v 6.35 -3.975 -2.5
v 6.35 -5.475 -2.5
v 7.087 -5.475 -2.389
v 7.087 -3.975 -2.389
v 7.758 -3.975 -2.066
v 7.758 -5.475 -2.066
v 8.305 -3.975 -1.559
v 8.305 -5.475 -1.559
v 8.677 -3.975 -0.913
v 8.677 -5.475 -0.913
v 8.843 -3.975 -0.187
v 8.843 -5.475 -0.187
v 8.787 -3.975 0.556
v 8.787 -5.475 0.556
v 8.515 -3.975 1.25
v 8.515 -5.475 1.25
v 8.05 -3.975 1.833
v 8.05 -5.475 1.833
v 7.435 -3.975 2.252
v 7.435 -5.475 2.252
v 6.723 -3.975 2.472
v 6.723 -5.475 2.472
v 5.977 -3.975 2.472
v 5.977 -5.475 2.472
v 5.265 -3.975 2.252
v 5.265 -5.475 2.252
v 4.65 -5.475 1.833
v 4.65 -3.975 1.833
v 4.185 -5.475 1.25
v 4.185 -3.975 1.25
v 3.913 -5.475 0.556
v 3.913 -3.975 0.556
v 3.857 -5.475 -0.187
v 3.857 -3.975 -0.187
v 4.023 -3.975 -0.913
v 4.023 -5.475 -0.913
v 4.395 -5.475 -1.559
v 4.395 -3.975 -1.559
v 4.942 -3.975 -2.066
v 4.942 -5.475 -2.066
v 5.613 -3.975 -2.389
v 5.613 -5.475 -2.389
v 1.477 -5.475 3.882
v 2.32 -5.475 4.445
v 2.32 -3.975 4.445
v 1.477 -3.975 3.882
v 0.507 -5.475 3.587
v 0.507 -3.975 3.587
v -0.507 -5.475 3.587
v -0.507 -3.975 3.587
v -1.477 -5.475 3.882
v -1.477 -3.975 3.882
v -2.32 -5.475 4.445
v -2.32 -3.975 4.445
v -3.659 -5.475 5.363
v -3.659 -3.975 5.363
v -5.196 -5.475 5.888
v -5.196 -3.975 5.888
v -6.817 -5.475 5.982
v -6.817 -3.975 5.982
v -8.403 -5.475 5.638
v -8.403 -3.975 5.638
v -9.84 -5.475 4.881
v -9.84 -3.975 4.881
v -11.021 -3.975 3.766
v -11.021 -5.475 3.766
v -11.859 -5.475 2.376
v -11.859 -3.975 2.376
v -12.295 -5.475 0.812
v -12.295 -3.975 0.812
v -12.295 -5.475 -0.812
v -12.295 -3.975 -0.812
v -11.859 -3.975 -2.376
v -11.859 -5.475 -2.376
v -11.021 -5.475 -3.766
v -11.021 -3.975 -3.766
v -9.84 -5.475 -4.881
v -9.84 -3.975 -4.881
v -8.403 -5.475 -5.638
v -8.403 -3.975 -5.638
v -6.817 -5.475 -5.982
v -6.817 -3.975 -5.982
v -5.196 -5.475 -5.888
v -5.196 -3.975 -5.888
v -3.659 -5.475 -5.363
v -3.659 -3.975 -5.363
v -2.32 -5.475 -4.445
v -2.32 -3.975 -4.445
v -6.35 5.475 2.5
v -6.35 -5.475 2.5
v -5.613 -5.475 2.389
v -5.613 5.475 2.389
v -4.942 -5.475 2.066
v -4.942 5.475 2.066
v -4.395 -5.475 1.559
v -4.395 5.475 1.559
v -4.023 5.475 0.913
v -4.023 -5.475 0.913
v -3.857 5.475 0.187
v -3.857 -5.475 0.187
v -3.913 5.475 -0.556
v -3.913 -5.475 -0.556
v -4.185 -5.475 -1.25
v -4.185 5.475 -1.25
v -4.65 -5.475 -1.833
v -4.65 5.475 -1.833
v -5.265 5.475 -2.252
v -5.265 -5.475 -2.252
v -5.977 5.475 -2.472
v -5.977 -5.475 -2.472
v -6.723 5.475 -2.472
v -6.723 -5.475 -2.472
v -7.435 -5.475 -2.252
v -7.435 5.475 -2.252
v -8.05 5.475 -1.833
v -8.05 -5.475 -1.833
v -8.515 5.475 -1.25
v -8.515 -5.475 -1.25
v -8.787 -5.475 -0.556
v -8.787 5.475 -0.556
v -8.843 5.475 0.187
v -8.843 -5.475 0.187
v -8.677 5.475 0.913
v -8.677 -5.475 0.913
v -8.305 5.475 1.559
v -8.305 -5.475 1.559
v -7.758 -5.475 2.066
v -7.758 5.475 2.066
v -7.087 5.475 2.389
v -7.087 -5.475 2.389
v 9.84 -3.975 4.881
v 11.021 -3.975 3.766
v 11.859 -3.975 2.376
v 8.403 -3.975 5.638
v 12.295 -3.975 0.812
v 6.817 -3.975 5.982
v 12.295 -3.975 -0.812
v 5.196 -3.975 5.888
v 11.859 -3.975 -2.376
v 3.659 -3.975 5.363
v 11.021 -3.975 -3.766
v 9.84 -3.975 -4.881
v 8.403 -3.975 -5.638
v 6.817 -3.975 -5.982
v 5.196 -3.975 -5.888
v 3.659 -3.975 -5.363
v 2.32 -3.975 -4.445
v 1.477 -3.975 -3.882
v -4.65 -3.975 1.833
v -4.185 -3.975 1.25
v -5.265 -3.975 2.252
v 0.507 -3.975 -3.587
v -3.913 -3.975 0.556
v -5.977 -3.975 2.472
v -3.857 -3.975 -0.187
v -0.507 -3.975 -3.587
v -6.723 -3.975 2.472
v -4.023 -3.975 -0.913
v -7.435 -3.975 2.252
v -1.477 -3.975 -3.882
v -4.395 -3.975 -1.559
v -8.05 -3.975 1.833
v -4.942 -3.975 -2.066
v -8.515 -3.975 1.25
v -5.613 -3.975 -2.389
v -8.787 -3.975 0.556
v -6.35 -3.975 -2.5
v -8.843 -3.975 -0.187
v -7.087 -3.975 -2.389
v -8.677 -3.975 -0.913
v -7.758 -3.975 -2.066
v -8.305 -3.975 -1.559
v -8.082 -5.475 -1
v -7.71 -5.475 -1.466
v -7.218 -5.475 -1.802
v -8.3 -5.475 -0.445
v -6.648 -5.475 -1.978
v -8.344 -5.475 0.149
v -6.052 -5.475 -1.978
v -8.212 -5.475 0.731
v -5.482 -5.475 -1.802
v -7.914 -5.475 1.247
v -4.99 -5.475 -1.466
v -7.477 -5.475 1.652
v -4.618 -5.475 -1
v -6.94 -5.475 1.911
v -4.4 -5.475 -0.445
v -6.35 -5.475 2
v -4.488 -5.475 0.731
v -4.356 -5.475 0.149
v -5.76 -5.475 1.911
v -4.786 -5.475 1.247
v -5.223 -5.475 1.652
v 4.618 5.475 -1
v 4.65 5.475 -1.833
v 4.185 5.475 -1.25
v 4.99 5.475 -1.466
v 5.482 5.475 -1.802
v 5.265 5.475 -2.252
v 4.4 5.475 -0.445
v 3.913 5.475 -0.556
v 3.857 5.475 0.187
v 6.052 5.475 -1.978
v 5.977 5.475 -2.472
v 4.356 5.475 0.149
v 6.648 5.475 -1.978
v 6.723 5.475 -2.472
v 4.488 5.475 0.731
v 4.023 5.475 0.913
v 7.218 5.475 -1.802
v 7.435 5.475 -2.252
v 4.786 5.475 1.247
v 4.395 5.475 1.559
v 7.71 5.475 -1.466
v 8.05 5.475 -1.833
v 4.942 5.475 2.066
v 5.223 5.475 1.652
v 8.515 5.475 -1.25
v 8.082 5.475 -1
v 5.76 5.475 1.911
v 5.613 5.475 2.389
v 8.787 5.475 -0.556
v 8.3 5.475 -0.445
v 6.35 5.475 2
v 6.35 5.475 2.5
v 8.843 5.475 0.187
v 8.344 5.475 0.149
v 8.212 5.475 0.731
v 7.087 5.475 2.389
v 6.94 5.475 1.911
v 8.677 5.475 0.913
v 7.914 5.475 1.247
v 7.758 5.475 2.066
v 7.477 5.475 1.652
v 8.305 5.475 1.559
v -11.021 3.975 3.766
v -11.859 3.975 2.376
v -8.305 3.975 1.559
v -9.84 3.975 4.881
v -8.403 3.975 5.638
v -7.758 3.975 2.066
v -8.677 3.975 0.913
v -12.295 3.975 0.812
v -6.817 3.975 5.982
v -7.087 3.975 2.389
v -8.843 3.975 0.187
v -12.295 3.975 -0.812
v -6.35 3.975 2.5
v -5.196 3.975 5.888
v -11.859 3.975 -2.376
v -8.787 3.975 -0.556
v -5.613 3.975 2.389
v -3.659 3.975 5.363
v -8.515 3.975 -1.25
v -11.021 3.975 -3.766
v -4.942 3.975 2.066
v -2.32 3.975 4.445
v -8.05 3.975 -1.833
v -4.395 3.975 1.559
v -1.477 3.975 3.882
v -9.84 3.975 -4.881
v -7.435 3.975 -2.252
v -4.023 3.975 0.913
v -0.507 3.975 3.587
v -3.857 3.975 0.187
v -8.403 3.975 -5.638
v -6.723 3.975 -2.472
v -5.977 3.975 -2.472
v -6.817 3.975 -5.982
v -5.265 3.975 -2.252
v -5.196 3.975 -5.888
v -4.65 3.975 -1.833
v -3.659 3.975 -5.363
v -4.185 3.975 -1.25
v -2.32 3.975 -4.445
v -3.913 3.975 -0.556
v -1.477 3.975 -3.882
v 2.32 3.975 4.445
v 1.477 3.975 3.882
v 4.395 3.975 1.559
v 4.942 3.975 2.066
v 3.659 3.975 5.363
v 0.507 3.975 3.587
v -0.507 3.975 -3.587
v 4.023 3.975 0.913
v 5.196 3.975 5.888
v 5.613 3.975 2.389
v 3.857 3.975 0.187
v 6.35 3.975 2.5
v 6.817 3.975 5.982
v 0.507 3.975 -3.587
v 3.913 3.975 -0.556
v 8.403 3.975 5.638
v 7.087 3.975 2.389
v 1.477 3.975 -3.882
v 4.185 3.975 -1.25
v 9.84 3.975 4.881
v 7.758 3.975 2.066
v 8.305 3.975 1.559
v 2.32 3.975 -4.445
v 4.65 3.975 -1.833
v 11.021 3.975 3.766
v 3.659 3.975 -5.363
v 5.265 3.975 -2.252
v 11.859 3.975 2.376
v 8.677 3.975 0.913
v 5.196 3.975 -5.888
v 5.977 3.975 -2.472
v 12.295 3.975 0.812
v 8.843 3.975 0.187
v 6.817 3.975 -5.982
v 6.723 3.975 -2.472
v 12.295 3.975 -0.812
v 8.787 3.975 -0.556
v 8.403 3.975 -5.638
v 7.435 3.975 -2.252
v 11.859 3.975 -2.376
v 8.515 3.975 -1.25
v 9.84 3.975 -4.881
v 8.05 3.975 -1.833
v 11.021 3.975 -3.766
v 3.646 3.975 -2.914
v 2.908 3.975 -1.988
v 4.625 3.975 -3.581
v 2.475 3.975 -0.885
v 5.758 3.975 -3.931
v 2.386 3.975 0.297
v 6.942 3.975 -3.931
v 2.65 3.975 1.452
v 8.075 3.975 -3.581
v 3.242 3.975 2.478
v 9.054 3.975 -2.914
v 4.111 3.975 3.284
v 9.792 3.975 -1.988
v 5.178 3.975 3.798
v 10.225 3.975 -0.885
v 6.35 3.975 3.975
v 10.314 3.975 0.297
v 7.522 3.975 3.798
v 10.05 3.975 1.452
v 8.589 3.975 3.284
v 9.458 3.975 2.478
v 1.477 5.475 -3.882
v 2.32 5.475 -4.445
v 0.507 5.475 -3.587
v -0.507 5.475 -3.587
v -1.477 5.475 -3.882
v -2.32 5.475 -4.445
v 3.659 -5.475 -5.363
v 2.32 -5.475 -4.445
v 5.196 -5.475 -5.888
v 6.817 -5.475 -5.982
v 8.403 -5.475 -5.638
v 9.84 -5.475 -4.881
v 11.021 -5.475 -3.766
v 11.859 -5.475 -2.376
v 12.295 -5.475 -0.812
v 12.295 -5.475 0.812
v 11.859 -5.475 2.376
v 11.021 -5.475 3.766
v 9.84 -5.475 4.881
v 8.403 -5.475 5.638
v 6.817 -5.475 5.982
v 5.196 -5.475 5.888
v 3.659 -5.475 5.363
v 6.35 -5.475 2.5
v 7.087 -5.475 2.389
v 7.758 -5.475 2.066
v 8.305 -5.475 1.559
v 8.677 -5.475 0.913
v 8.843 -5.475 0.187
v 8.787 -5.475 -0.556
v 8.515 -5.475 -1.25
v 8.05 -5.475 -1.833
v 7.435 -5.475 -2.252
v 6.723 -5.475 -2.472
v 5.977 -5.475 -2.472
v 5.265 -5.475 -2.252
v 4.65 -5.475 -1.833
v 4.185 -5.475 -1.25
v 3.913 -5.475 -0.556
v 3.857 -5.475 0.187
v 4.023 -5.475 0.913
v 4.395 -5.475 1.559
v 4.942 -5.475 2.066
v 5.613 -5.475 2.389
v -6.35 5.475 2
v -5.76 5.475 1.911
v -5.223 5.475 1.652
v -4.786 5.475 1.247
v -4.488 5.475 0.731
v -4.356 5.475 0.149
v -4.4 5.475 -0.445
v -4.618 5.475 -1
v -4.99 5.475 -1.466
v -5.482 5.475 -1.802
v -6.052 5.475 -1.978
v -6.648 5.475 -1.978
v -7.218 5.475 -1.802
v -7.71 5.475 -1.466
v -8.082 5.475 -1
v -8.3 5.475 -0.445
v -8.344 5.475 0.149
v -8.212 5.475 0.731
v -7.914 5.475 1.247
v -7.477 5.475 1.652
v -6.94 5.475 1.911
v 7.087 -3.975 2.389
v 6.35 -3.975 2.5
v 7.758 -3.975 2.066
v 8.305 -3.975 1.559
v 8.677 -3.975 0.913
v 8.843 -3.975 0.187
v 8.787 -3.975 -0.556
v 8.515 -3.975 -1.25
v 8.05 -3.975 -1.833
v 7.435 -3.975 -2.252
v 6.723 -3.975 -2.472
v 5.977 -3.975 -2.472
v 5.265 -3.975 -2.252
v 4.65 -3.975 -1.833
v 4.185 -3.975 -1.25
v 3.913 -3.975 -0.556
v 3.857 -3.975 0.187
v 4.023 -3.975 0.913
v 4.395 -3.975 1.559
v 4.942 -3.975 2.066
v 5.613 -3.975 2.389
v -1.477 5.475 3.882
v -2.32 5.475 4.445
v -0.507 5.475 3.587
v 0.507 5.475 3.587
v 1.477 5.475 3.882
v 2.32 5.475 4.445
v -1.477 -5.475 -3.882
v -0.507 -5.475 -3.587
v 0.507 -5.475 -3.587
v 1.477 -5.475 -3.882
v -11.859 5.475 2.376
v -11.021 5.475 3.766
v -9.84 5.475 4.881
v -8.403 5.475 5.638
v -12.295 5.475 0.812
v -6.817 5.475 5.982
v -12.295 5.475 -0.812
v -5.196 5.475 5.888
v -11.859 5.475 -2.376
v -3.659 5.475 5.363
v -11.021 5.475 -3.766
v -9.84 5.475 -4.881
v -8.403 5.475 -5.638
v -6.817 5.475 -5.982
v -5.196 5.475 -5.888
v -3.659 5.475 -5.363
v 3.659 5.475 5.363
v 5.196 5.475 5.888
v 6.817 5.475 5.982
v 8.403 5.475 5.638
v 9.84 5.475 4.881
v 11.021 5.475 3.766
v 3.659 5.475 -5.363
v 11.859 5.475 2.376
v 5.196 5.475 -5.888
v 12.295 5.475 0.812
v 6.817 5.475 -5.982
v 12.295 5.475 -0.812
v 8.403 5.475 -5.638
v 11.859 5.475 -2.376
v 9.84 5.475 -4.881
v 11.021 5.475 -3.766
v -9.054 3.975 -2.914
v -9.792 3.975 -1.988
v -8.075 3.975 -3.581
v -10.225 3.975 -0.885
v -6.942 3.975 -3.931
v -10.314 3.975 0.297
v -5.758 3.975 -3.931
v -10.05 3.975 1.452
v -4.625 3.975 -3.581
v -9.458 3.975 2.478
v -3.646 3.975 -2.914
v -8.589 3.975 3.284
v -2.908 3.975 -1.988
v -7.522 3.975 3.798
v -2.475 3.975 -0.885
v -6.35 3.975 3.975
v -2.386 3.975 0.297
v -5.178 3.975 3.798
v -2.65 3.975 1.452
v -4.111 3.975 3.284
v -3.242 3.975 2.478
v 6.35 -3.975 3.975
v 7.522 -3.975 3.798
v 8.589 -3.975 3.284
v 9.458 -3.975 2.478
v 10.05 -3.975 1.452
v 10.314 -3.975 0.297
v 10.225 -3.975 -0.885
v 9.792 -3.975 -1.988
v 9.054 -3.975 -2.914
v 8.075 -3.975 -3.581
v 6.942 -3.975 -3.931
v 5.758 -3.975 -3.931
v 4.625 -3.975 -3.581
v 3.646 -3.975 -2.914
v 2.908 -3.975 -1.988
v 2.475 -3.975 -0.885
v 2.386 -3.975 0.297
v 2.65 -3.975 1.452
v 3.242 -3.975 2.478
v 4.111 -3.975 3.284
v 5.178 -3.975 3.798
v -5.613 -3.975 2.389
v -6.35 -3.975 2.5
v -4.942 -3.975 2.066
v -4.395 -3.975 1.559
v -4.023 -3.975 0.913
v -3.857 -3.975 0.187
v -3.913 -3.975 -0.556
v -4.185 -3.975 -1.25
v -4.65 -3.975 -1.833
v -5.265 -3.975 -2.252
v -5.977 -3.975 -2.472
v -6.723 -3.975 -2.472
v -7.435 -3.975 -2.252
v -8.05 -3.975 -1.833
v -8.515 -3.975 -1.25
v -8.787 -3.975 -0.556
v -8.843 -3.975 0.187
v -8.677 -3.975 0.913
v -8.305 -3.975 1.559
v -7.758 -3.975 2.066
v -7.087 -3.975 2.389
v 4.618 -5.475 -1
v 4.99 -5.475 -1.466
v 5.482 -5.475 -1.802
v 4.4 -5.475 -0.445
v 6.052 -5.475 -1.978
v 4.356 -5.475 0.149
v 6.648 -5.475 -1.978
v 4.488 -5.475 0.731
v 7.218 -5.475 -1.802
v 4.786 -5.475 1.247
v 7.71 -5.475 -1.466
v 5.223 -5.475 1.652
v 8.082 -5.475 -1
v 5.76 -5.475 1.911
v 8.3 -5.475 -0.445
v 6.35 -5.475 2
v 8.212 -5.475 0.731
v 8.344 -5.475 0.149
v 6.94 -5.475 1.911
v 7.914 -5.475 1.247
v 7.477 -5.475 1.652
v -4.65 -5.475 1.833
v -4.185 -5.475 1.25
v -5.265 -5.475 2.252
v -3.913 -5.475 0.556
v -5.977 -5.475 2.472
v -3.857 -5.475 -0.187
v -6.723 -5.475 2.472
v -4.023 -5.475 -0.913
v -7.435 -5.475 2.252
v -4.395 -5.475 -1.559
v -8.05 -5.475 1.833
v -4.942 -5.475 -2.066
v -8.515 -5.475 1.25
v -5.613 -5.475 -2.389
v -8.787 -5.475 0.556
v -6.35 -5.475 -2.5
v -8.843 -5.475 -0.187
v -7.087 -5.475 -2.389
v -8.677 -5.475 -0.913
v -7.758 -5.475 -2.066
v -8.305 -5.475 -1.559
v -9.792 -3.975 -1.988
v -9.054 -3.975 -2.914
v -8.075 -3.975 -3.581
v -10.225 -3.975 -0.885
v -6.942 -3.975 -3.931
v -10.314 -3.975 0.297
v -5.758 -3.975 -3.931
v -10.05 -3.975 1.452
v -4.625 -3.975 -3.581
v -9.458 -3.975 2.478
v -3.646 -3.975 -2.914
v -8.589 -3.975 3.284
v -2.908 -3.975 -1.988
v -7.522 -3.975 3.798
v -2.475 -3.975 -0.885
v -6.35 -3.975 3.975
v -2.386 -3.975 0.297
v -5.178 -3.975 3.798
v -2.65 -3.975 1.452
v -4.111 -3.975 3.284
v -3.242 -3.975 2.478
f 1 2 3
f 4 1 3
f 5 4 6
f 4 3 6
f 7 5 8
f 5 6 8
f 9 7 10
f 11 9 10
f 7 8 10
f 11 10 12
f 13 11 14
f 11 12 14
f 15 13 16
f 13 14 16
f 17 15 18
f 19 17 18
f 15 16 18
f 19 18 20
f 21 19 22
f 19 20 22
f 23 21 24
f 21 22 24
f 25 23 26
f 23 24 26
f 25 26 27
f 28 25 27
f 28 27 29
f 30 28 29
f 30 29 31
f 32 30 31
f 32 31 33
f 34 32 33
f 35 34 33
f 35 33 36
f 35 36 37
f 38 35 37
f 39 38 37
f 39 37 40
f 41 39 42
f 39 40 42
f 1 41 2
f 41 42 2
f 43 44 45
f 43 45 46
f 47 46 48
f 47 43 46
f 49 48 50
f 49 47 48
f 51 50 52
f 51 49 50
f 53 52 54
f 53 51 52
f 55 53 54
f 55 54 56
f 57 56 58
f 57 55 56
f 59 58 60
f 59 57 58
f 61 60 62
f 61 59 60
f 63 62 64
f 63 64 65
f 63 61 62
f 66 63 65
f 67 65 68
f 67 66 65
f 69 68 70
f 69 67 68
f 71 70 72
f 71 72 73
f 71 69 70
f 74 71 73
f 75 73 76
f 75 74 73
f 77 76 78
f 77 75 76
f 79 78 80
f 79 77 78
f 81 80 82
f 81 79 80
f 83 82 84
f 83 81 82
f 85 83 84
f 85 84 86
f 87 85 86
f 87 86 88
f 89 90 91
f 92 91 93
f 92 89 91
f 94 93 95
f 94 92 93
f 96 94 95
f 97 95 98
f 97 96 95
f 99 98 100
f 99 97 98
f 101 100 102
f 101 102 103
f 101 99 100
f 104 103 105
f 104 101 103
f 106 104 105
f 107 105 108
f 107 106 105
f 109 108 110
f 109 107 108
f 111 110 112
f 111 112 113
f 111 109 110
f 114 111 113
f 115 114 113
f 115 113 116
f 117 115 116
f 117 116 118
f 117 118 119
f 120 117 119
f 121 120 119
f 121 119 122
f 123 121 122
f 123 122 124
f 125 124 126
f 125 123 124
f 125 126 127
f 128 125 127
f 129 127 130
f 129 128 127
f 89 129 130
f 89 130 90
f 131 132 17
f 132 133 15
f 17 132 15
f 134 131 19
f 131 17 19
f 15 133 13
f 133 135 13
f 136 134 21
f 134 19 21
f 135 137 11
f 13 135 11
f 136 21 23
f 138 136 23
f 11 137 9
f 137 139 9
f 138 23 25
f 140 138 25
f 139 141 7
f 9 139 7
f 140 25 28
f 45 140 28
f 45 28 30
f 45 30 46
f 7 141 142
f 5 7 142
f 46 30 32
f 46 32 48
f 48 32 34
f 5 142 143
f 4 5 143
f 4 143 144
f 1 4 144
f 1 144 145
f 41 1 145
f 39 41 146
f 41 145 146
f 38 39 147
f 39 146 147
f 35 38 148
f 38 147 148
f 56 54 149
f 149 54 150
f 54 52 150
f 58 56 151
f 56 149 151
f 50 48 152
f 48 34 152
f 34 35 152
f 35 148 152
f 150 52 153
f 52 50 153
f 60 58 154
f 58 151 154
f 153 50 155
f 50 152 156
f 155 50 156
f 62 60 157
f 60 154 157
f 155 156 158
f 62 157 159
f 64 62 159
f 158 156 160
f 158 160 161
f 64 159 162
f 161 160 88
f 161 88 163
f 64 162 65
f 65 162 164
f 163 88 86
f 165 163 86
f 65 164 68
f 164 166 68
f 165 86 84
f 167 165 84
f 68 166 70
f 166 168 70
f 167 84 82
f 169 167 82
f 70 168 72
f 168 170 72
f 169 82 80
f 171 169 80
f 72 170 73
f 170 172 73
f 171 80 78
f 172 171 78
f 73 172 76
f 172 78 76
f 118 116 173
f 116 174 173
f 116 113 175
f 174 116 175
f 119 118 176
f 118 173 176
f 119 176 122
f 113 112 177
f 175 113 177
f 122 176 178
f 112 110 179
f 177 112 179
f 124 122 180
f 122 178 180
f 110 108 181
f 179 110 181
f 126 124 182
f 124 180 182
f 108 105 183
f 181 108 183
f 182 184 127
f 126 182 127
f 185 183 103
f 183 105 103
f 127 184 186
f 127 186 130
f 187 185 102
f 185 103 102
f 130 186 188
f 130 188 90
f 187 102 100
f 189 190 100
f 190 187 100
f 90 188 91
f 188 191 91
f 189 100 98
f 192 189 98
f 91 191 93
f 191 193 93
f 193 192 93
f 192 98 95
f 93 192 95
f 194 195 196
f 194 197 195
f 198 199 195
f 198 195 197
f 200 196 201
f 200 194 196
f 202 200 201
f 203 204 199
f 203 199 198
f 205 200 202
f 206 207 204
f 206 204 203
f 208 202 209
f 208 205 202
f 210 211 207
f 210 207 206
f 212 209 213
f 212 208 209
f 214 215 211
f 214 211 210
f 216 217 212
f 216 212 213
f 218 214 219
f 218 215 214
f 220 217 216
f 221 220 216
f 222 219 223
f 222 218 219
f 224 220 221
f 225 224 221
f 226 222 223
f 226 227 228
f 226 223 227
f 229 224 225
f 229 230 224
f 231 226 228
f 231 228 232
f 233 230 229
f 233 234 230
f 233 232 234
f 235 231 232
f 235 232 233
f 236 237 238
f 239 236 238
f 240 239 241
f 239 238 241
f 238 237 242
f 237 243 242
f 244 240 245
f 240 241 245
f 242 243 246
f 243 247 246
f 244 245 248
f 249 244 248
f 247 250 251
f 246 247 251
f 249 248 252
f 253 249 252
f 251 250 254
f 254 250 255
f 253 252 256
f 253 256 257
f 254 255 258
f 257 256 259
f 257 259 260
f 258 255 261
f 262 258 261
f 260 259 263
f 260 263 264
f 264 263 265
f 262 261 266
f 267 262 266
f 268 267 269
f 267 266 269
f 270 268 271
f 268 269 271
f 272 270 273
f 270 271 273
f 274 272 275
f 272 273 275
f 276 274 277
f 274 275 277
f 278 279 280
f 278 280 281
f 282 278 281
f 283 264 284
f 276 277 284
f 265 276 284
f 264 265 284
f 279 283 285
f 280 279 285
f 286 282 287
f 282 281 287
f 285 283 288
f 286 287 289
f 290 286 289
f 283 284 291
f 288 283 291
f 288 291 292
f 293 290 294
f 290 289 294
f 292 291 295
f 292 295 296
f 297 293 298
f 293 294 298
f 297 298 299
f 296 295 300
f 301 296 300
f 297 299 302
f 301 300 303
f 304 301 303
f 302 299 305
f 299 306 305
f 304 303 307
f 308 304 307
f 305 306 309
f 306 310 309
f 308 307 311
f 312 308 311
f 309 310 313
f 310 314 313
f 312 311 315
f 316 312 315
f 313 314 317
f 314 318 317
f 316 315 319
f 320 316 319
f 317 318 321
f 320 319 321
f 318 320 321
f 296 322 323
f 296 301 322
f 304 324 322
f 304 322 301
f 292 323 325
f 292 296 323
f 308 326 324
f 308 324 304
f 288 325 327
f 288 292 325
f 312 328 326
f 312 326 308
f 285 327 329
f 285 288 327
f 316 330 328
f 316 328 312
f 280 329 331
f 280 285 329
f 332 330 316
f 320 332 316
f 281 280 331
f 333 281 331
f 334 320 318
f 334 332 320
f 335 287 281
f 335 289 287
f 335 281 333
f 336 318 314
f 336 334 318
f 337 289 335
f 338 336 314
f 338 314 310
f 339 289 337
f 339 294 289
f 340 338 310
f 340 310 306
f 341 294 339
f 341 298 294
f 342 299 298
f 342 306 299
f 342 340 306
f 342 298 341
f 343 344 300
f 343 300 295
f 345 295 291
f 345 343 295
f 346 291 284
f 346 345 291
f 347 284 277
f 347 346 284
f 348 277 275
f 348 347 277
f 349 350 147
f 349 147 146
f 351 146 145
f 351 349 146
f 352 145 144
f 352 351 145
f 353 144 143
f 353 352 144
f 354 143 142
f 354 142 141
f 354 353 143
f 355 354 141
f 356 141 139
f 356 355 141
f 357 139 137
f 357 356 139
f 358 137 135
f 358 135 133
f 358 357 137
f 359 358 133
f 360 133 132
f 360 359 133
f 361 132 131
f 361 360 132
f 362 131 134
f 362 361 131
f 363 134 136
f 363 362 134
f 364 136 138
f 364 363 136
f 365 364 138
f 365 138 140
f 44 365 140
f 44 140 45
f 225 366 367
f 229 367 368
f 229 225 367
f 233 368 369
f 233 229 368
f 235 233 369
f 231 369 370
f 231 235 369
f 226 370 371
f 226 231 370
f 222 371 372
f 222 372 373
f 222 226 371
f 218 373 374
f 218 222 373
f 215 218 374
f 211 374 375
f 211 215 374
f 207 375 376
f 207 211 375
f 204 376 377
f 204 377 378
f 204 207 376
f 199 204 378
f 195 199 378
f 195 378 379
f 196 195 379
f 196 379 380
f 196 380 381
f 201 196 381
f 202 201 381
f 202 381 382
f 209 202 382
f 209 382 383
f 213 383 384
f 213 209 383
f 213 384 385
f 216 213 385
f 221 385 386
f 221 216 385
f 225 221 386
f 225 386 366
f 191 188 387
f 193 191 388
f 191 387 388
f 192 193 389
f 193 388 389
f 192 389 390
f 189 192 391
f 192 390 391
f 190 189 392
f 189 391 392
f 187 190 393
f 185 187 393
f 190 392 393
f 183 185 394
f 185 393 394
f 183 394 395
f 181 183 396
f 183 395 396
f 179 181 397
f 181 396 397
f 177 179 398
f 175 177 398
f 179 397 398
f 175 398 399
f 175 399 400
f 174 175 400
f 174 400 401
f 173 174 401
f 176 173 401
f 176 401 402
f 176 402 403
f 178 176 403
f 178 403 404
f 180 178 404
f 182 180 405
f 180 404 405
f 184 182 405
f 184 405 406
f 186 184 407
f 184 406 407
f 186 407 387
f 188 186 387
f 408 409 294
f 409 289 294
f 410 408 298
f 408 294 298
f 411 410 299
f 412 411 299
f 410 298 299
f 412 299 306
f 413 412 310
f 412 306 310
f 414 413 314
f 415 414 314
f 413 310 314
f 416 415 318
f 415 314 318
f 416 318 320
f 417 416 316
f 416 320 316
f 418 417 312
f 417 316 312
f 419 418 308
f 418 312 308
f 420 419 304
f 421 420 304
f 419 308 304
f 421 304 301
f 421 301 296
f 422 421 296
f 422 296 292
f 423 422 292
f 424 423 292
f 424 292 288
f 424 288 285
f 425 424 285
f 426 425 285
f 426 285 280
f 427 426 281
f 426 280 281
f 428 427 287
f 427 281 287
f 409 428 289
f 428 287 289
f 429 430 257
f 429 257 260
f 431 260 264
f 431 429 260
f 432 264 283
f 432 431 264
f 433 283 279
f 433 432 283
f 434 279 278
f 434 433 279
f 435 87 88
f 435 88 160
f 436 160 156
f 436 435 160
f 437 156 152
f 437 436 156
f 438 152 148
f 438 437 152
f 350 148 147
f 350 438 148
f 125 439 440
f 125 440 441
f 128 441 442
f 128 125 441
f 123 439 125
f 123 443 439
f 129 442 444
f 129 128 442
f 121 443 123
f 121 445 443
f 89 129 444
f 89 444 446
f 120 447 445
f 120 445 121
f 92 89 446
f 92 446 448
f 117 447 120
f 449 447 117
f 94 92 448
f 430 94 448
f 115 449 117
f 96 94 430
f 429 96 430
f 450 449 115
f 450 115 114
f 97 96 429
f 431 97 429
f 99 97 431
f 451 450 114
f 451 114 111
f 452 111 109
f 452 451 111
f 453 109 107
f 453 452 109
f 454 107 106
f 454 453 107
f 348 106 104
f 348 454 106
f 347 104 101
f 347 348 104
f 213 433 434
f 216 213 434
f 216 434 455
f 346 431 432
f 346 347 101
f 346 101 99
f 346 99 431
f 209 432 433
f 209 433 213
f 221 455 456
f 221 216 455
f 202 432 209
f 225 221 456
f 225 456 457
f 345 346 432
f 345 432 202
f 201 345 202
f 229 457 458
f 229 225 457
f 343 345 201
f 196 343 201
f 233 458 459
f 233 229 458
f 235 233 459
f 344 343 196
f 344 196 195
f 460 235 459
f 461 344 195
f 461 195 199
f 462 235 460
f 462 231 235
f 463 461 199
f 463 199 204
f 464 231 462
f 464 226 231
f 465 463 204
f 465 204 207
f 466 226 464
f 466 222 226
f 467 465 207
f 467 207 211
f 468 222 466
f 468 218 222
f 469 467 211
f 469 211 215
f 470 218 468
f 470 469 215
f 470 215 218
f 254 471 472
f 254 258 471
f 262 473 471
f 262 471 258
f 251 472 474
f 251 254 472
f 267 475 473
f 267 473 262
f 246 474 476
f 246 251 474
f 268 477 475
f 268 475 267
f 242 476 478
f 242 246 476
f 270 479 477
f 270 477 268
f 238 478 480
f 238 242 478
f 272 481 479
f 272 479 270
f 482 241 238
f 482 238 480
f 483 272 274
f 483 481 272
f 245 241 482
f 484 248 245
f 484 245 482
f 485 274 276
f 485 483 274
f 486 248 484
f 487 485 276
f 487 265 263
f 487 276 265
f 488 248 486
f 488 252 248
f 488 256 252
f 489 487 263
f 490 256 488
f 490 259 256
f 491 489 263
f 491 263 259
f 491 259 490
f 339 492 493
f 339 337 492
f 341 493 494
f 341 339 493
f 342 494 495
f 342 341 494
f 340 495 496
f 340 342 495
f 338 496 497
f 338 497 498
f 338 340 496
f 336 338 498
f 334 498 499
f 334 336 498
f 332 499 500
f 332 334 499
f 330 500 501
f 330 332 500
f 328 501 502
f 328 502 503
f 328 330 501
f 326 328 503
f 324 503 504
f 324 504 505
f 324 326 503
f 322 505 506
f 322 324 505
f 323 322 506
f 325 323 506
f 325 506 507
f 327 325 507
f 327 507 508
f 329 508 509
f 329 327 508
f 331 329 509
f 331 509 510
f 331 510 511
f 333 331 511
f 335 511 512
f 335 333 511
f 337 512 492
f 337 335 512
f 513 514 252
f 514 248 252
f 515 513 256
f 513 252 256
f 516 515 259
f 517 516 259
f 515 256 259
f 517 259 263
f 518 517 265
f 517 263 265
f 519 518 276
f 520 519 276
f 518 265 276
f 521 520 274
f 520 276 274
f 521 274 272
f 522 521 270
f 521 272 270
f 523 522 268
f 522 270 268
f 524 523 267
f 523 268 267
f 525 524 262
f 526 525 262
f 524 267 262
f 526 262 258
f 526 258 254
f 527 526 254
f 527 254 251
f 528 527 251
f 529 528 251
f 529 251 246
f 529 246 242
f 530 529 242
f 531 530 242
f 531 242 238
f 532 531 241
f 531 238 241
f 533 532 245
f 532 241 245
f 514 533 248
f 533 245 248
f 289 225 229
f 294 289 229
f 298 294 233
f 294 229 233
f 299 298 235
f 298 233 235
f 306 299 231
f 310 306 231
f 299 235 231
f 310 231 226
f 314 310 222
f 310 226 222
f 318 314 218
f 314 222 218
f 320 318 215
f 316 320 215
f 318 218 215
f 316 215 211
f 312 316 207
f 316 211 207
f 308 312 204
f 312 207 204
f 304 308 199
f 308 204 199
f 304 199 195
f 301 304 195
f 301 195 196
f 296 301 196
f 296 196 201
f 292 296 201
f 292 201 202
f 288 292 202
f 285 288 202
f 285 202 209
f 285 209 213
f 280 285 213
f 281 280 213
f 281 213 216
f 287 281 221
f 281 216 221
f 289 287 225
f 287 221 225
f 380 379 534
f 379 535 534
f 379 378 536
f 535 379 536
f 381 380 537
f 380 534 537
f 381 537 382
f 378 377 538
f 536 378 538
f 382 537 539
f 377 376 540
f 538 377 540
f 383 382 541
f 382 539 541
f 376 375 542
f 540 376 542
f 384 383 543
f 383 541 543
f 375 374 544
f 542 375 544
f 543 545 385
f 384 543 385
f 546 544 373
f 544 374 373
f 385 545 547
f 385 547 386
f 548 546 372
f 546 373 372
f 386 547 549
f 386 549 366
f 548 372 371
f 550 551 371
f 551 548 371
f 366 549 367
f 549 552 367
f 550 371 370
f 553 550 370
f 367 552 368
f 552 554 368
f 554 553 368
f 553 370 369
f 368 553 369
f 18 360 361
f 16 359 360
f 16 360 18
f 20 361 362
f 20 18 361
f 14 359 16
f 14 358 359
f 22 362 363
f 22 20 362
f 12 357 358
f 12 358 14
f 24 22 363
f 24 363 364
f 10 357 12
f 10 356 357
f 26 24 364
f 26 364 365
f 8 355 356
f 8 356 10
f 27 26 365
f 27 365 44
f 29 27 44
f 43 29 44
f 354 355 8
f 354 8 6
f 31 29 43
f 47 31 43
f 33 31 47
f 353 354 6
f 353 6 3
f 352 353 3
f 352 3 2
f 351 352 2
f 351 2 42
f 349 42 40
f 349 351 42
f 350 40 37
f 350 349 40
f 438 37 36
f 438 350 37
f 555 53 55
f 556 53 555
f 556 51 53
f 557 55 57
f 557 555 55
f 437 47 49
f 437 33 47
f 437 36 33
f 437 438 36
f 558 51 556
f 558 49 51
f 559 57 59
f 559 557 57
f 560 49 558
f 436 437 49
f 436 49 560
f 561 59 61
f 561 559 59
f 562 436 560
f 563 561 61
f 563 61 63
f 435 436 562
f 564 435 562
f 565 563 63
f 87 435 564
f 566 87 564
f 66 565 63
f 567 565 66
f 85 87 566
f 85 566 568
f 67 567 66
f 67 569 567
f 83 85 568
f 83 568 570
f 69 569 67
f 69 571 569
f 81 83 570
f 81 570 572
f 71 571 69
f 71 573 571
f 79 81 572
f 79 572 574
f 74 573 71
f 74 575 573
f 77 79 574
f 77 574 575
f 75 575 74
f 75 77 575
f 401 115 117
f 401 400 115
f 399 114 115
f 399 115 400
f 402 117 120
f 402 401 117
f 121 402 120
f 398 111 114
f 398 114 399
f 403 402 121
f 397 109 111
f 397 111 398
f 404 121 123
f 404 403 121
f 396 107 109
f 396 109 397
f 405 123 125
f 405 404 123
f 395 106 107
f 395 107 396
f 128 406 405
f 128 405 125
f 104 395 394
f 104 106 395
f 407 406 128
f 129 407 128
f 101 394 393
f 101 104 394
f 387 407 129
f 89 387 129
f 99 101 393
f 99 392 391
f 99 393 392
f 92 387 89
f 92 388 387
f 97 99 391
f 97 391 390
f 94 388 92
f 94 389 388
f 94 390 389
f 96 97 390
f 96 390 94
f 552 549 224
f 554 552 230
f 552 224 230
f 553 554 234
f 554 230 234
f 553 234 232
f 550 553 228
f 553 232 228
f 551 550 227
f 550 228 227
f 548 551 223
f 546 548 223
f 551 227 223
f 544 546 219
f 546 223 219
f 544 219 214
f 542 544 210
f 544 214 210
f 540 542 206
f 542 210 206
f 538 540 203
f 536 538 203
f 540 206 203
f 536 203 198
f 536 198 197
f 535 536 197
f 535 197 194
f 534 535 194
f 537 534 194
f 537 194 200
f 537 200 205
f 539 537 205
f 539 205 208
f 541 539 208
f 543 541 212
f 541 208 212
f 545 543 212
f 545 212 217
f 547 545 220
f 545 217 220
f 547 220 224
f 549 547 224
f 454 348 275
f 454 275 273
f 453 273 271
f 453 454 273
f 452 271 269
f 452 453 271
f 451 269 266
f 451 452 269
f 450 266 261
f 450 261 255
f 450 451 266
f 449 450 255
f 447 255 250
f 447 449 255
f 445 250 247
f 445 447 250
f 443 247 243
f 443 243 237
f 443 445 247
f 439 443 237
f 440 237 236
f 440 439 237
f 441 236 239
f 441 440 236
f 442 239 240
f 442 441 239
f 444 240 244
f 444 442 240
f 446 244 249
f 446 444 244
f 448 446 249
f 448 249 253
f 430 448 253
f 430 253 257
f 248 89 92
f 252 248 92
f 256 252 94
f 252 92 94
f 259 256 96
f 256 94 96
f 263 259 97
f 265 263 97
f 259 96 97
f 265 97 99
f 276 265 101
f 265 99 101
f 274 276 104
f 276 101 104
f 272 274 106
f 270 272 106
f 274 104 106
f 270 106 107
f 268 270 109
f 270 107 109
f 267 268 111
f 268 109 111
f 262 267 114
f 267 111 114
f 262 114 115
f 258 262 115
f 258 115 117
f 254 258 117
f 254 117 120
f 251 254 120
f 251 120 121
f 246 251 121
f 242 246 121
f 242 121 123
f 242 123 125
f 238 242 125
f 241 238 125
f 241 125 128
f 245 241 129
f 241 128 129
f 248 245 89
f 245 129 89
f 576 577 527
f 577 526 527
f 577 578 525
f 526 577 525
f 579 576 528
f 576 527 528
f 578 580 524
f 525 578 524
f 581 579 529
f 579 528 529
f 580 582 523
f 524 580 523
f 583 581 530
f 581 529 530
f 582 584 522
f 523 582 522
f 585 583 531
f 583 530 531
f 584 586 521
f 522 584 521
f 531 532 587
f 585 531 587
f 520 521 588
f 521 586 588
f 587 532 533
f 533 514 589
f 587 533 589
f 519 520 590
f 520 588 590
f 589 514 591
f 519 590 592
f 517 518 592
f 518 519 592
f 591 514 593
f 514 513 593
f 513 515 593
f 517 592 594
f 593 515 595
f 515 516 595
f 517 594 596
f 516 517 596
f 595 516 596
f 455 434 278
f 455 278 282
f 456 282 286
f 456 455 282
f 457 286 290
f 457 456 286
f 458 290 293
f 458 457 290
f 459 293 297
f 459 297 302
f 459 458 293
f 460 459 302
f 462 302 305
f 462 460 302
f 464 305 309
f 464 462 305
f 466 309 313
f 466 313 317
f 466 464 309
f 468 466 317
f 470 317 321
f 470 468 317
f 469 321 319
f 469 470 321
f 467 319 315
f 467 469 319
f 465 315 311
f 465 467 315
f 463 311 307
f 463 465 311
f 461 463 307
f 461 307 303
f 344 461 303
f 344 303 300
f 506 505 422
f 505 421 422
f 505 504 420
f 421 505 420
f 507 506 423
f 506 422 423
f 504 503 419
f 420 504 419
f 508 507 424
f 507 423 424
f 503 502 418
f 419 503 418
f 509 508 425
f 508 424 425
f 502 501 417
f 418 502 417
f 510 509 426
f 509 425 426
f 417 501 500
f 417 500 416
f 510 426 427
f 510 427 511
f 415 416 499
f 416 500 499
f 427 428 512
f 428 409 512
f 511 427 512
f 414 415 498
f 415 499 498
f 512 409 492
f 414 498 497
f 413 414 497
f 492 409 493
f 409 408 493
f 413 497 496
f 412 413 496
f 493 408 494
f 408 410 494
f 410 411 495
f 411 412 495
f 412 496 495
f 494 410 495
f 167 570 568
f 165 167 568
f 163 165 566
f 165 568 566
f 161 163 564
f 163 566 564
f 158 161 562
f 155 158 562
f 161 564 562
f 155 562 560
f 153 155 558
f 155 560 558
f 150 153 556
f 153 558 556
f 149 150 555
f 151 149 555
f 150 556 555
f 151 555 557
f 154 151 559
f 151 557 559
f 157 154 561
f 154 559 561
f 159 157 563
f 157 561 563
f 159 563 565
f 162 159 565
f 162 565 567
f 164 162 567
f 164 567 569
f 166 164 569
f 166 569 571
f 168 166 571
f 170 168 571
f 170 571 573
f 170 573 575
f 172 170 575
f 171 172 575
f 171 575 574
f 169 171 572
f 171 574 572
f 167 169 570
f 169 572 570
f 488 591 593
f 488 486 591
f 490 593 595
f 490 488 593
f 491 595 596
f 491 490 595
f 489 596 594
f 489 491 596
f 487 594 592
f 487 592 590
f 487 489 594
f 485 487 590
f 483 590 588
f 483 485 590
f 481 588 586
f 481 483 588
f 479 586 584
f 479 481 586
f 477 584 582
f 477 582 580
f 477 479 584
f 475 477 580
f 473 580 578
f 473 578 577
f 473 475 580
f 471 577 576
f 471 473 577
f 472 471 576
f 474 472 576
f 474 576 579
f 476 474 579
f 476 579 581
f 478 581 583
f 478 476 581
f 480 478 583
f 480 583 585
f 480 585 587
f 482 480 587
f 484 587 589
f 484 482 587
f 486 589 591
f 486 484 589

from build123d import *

# Parameters (mm, degrees)
ESBO_O85_R                = 2.5
RESSALTO_EXTRUS_O9_DEPTH  = 1.5
ESBO_O90_R                = 2.5
RESSALTO_EXTRUS_O10_DEPTH = 1.5
ESBO_O96_W                = 1.475
ESBO_O96_H                = 7.95
ESBO_O103_W               = 1.475
ESBO_O103_H               = 7.95
ESBO_O110_W               = 0.5
ESBO_O110_H               = 10.95
ESBO_O117_W               = 0.5
ESBO_O117_H               = 10.95


with BuildPart() as part:
    # Esboço85 → Ressalto-extrusão9 (new body)
    with BuildSketch(Plane(origin=(0, 5.475, 0), x_dir=(1, 0, 0), z_dir=(0, 1, 0))):
        with BuildLine():
            ThreePointArc((2.319994603, 4.445116028), (0, 3.55), (-2.319994603, 4.445116028))
            ThreePointArc((-2.319994603, 4.445116028), (-12.35, 0), (-2.319994603, -4.445116028))
            ThreePointArc((-2.319994603, -4.445116028), (0, -3.55), (2.319994603, -4.445116028))
            ThreePointArc((2.319994603, -4.445116028), (12.35, 0), (2.319994603, 4.445116028))
        make_face()
        with Locations(Location((6.35, 0, 0), (0, 0, 270))):
            Circle(ESBO_O85_R, mode=Mode.SUBTRACT)
        with Locations(Location((-6.35, 0, 0), (0, 0, 270))):
            Circle(ESBO_O85_R, mode=Mode.SUBTRACT)
    extrude(amount=-RESSALTO_EXTRUS_O9_DEPTH)


with BuildPart() as body_2:
    # Esboço90 → Ressalto-extrusão10 (new body)
    with BuildSketch(Plane(origin=(0, -5.475, 0), x_dir=(-1, 0, 0), z_dir=(0, -1, 0))):
        with BuildLine():
            ThreePointArc((2.319994603, 4.445116028), (0, 3.55), (-2.319994603, 4.445116028))
            ThreePointArc((-2.319994603, 4.445116028), (-12.35, 0), (-2.319994603, -4.445116028))
            ThreePointArc((-2.319994603, -4.445116028), (0, -3.55), (2.319994603, -4.445116028))
            ThreePointArc((2.319994603, -4.445116028), (12.35, 0), (2.319994603, 4.445116028))
        make_face()
        with Locations(Location((-6.35, 0, 0), (0, 0, 90))):
            Circle(ESBO_O90_R, mode=Mode.SUBTRACT)
        with Locations(Location((6.35, 0, 0), (0, 0, 90))):
            Circle(ESBO_O90_R, mode=Mode.SUBTRACT)
    extrude(amount=-RESSALTO_EXTRUS_O10_DEPTH)


with BuildPart() as body_3:
    # Esboço96 → Revolução13 (revolve)
    with BuildSketch(Plane(origin=(0, 0, 0), x_dir=(-1, 0, 0), z_dir=(0, 0, -1)), mode=Mode.PRIVATE) as revolu_o13_sk:
        with Locations((3.1125, 0)):
            Rectangle(ESBO_O96_W, ESBO_O96_H)
    revolve(revolu_o13_sk.sketch.rotate(Axis((-6.35, -3.975, 0), (0, 1, 0)), 270), axis=Axis((-6.35, -3.975, 0), (0, 1, 0)))


with BuildPart() as body_4:
    # Esboço103 → Revolução14 (revolve)
    with BuildSketch(Plane(origin=(0, 0, 0), x_dir=(-1, 0, 0), z_dir=(0, 0, -1)), mode=Mode.PRIVATE) as revolu_o14_sk:
        with Locations((-9.5875, 0)):
            Rectangle(ESBO_O103_W, ESBO_O103_H)
    revolve(revolu_o14_sk.sketch.rotate(Axis((6.35, -3.975, 0), (0, 1, 0)), 270), axis=Axis((6.35, -3.975, 0), (0, 1, 0)))


with BuildPart() as body_5:
    # Esboço110 → Revolução15 (revolve)
    with BuildSketch(Plane(origin=(0, 0, 0), x_dir=(-1, 0, 0), z_dir=(0, 0, -1)), mode=Mode.PRIVATE) as revolu_o15_sk:
        with Locations((4.1, 0)):
            Rectangle(ESBO_O110_W, ESBO_O110_H)
    revolve(revolu_o15_sk.sketch.rotate(Axis((-6.35, -5.475, 0), (0, 1, 0)), 270), axis=Axis((-6.35, -5.475, 0), (0, 1, 0)))


with BuildPart() as body_6:
    # Esboço117 → Revolução16 (revolve)
    with BuildSketch(Plane(origin=(0, 0, 0), x_dir=(-1, 0, 0), z_dir=(0, 0, -1)), mode=Mode.PRIVATE) as revolu_o16_sk:
        with Locations((-8.6, 0)):
            Rectangle(ESBO_O117_W, ESBO_O117_H)
    revolve(revolu_o16_sk.sketch.rotate(Axis((6.35, -5.475, 0), (0, 1, 0)), 270), axis=Axis((6.35, -5.475, 0), (0, 1, 0)))


solid = Compound([part.part, body_2.part, body_3.part, body_4.part, body_5.part, body_6.part])
